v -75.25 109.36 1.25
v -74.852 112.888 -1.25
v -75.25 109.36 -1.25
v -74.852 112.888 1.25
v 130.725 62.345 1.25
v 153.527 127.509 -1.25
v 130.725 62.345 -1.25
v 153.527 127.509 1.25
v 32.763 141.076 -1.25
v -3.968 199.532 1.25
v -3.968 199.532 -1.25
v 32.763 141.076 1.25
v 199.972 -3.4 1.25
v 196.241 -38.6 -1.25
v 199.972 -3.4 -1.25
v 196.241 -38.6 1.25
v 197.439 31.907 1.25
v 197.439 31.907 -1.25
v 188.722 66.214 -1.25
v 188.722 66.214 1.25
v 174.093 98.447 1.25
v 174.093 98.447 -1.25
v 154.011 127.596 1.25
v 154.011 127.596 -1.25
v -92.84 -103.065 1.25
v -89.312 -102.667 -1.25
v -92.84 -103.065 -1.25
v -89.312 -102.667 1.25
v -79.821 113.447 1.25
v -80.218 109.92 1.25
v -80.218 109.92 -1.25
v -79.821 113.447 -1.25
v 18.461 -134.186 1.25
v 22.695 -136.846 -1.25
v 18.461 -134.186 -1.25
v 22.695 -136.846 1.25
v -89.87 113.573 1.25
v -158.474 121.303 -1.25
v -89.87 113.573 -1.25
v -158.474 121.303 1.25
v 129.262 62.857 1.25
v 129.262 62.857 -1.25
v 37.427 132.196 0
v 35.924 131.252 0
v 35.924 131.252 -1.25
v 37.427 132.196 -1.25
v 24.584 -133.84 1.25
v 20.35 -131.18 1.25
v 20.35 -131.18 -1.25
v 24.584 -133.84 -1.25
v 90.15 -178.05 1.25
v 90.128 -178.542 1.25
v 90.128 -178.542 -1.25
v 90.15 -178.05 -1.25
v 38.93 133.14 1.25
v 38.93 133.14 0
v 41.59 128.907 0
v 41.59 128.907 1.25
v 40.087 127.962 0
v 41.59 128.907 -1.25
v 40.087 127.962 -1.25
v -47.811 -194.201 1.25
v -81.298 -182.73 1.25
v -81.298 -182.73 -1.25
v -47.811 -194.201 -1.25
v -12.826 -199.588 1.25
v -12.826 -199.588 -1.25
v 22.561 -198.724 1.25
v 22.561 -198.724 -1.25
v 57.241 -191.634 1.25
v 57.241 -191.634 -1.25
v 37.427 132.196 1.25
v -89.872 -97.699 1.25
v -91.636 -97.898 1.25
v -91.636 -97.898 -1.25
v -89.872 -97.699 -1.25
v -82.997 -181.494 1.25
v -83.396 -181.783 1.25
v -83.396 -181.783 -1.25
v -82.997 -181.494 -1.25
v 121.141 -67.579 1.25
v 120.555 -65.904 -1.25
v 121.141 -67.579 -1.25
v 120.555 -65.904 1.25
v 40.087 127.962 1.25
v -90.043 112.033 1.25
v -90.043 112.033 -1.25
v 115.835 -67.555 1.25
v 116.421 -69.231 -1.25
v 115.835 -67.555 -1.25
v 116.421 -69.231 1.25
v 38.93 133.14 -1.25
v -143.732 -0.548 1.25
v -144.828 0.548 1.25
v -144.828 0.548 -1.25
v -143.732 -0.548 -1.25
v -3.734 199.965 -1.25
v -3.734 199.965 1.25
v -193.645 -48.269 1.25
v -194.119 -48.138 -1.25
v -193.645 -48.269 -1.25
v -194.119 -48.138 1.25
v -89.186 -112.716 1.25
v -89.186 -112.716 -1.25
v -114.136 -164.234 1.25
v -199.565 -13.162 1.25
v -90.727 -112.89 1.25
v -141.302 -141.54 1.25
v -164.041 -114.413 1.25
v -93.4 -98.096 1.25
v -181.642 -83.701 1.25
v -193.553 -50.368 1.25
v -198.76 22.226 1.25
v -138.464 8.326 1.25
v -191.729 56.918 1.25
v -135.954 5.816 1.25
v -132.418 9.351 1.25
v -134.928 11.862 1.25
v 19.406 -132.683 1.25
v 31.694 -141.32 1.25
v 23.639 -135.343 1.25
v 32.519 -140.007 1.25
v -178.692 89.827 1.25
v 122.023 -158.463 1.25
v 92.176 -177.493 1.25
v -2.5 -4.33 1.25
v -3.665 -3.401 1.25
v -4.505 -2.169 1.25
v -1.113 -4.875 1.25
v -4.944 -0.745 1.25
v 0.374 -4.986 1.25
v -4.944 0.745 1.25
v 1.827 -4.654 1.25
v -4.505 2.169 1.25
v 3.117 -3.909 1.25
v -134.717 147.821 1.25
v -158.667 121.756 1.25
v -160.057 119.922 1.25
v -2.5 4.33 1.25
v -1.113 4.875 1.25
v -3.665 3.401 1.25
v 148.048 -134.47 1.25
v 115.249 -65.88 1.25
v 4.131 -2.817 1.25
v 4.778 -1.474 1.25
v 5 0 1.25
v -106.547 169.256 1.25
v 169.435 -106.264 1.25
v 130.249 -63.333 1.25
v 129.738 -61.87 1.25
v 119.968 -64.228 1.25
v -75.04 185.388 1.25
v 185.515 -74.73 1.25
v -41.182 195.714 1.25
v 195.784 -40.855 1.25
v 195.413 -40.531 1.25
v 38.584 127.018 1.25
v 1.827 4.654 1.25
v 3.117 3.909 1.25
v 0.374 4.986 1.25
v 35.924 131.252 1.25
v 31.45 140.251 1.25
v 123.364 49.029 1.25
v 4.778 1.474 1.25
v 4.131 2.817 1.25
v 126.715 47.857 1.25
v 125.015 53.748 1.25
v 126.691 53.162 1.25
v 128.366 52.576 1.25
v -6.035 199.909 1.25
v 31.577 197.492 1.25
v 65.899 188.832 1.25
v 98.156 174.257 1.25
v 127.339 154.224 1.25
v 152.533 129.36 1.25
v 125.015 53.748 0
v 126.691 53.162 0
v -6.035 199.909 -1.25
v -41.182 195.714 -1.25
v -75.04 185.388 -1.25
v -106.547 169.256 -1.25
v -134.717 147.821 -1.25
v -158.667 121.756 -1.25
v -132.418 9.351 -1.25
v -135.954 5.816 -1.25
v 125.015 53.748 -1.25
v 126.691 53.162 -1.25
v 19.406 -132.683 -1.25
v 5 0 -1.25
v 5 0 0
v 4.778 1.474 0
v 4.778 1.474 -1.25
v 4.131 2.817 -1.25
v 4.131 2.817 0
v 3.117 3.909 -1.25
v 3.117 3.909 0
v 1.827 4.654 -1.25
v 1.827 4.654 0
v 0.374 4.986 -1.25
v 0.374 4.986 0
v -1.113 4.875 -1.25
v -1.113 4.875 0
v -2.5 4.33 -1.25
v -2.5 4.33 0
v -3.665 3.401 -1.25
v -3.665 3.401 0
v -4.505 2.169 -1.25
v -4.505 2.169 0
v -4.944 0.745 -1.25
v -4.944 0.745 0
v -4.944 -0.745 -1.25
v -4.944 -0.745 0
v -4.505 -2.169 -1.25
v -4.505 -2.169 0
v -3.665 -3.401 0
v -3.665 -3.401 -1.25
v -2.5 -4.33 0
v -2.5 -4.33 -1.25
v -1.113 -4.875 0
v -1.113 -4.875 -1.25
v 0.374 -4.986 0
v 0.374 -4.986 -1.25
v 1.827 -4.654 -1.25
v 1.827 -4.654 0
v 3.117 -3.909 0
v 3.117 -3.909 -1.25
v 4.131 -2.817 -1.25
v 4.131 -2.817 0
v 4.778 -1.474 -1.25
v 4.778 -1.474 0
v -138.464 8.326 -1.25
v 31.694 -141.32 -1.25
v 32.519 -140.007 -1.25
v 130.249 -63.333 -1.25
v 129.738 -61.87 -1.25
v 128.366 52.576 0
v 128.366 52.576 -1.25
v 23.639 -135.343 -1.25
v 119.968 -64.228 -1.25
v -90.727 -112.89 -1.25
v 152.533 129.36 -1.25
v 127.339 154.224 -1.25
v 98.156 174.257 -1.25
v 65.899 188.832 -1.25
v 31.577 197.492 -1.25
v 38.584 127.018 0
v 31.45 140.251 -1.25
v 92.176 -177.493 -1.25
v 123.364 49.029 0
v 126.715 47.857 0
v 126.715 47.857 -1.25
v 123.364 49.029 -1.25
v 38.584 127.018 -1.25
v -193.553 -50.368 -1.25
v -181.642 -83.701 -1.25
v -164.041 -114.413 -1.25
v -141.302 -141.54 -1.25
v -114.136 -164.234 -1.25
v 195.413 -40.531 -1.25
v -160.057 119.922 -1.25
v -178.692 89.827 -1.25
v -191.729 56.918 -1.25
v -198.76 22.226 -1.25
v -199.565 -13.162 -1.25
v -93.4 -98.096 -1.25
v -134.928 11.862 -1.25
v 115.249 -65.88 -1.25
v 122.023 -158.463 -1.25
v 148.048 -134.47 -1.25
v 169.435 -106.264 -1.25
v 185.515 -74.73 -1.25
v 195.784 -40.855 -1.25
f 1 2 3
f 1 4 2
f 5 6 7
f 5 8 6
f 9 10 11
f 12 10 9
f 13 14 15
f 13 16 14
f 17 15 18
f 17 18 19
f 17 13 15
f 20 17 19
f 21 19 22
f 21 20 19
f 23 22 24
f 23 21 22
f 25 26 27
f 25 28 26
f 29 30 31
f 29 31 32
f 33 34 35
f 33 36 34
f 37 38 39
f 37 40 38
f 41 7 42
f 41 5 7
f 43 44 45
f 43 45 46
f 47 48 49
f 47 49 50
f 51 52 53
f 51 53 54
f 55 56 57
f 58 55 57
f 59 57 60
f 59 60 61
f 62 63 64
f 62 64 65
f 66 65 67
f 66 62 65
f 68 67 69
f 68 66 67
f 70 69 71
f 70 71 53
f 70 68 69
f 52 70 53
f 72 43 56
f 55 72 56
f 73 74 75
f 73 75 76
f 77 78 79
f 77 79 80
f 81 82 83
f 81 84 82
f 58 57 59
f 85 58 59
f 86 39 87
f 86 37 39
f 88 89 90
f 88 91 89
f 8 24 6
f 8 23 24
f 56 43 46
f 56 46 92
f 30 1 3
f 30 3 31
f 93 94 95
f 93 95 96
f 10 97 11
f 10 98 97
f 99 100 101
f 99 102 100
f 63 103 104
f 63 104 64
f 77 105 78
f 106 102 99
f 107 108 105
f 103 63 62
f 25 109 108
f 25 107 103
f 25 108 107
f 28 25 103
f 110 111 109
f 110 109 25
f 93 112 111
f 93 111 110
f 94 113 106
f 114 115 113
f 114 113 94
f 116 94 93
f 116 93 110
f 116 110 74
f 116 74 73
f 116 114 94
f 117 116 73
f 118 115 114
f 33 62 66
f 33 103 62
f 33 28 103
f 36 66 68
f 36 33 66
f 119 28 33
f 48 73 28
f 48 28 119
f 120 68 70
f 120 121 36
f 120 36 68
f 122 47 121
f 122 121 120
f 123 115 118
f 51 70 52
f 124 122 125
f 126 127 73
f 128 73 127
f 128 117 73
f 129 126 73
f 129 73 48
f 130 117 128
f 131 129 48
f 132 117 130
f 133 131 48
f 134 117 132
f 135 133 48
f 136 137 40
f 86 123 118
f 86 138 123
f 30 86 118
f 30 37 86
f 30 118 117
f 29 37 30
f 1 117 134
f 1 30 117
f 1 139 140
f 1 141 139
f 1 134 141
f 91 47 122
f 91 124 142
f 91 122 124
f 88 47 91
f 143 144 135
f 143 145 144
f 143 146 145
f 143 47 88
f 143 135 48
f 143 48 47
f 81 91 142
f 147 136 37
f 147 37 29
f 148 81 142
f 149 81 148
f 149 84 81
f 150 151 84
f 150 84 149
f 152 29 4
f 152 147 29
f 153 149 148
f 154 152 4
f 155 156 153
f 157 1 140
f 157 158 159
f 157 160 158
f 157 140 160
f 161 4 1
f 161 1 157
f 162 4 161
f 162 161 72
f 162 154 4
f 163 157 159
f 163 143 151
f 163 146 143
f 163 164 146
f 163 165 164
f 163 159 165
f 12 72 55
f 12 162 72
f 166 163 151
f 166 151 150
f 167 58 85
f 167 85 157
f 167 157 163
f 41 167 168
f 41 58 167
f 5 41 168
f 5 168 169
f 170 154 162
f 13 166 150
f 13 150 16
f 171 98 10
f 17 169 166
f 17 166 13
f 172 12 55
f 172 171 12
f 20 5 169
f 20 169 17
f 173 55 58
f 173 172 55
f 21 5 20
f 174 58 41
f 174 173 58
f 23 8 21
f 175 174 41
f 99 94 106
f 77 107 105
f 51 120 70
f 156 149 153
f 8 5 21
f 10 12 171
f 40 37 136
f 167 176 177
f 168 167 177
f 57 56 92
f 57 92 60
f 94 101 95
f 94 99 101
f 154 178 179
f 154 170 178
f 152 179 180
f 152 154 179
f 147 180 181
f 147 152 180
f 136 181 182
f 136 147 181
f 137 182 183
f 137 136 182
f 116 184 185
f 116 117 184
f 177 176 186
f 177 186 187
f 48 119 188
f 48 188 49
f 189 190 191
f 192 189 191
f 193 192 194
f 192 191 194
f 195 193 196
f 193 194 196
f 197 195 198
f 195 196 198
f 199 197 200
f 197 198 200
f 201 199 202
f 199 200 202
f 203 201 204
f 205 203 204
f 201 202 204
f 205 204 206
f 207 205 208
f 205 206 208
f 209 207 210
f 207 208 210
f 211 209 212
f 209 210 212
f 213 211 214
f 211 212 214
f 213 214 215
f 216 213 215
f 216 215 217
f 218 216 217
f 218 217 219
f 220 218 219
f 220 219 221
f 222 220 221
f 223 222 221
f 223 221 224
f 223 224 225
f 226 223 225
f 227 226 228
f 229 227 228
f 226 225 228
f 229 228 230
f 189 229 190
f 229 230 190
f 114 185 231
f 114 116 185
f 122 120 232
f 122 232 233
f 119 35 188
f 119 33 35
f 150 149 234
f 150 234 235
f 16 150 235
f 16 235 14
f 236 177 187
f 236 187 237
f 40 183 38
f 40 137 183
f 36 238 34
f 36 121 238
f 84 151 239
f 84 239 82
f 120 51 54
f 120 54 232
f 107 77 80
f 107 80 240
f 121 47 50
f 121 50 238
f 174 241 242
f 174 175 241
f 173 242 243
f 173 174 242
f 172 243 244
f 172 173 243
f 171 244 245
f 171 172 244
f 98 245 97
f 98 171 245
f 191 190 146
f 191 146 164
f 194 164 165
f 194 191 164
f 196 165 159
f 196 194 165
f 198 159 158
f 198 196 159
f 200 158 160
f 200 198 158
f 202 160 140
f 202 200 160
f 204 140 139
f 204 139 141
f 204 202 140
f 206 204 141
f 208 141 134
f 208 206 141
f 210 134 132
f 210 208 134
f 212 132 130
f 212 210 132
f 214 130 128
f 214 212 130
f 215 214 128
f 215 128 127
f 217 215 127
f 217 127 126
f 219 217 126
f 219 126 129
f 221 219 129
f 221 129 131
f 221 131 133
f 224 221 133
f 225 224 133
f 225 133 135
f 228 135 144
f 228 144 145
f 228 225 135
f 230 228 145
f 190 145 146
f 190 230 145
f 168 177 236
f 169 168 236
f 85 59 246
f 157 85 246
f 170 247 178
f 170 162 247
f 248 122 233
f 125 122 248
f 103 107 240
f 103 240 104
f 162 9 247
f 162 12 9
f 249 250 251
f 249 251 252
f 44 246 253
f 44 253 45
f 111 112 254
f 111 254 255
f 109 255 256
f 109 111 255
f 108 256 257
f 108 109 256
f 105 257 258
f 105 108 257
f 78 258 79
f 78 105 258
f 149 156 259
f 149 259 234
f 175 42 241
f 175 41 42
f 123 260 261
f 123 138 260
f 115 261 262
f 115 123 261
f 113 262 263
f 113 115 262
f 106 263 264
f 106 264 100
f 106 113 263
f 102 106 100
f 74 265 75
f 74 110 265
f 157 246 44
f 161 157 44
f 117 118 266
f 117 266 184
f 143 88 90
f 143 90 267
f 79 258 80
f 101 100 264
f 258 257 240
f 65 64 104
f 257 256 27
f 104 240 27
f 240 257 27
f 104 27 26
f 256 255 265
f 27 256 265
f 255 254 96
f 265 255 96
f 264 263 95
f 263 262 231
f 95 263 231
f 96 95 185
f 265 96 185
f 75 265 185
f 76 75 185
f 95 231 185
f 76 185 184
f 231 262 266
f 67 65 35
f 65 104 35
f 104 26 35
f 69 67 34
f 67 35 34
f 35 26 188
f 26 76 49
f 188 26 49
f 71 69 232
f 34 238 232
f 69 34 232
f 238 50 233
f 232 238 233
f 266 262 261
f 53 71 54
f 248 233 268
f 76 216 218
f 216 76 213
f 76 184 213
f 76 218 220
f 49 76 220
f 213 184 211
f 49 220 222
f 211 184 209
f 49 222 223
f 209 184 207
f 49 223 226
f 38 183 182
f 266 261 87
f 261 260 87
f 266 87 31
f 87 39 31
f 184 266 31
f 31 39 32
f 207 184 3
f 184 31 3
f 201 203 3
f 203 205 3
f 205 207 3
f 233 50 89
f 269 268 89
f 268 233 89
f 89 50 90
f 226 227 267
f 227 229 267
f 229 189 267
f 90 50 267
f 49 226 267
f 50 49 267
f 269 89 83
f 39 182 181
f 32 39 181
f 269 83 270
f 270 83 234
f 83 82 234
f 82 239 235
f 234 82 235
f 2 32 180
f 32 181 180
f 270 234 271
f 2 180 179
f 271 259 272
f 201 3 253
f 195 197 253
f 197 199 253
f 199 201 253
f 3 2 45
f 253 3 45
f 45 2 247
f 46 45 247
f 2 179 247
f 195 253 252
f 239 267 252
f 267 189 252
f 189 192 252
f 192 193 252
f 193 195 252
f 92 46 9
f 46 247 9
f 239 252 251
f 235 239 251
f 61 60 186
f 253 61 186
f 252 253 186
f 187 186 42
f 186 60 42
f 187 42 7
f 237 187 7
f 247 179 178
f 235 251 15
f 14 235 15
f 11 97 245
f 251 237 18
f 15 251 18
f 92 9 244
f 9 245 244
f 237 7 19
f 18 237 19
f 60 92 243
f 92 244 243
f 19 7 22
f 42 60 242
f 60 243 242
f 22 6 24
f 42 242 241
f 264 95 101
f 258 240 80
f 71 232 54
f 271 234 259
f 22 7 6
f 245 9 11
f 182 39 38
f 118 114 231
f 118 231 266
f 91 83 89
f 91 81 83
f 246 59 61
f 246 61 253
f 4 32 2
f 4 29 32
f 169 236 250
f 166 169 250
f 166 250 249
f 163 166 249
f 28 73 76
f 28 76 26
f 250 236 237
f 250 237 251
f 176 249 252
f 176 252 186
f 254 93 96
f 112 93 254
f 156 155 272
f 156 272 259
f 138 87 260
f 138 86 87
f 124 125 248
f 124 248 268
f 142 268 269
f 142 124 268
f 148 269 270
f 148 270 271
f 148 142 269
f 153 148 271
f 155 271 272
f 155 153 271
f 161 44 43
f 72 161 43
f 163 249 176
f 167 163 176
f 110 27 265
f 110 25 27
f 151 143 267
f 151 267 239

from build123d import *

# Parameters (mm, degrees)
F0_R          = 5
F1_DEPTH      = 1.25
F1_DEPTH_BACK = 1.25


with BuildPart() as f1:
    # F0 (on Top) → F1 (new body, two sides)
    with BuildSketch(Plane.XY) as f1_sk:
        with BuildLine():
            Line((-193.64496, -48.269231), (-144.827721, 0.548008))
            Line((-144.827721, 0.548008), (-143.731706, -0.548008))
            Line((-143.731706, -0.548008), (-193.552665, -50.368296))
            ThreePointArc((-193.552665, -50.368296), (-153.272634, -128.48028), (-83.395599, -181.782841))
            Line((-83.395599, -181.782841), (-82.996864, -181.493909))
            Line((-82.996864, -181.493909), (-90.726667, -112.890004))
            Line((-90.726667, -112.890004), (-89.186413, -112.716459))
            Line((-89.186413, -112.716459), (-81.298203, -182.730495))
            ThreePointArc((-81.298203, -182.730495), (4.886394, -199.940324), (90.127633, -178.541862))
            Line((90.127633, -178.541862), (90.150343, -178.049972))
            Line((90.150343, -178.049972), (31.694198, -141.319541))
            Line((31.694198, -141.319541), (32.518847, -140.007118))
            Line((32.518847, -140.007118), (92.176243, -177.492904))
            ThreePointArc((92.176243, -177.492904), (159.366647, -120.841226), (195.783698, -40.855219))
            Line((195.783698, -40.855219), (195.413283, -40.530774))
            Line((195.413283, -40.530774), (130.249465, -63.33258))
            Line((130.249465, -63.33258), (129.737532, -61.869561))
            Line((129.737532, -61.869561), (196.240878, -38.599537))
            ThreePointArc((196.240878, -38.599537), (193.841344, 49.25378), (154.011425, 127.596237))
            Line((154.011425, 127.596237), (153.526814, 127.508923))
            Line((153.526814, 127.508923), (130.725008, 62.345105))
            Line((130.725008, 62.345105), (129.261989, 62.857037))
            Line((129.261989, 62.857037), (152.532909, 129.360069))
            ThreePointArc((152.532909, 129.360069), (82.350335, 182.259685), (-3.733812, 199.965124))
            Line((-3.733812, 199.965124), (-3.967697, 199.5318))
            Line((-3.967697, 199.5318), (32.762734, 141.075654))
            Line((32.762734, 141.075654), (31.450311, 140.251005))
            Line((31.450311, 140.251005), (-6.034672, 199.908905))
            ThreePointArc((-6.034672, 199.908905), (-91.151376, 178.02033), (-158.666634, 121.756194))
            Line((-158.666634, 121.756194), (-158.473672, 121.303162))
            Line((-158.473672, 121.303162), (-89.869768, 113.573359))
            Line((-89.869768, 113.573359), (-90.043313, 112.033105))
            Line((-90.043313, 112.033105), (-160.057242, 119.922257))
            ThreePointArc((-160.057242, 119.922257), (-196.013462, 39.728035), (-194.119464, -48.137634))
            Line((-194.119464, -48.137634), (-193.64496, -48.269231))
        make_face()
        Polygon((-91.636007, -97.897549), (-89.872168, -97.698812), (-89.312346, -102.667373), (-91.076185, -102.86611), (-92.840024, -103.064847), (-93.399847, -98.096286), align=None, mode=Mode.SUBTRACT)
        Circle(F0_R, mode=Mode.SUBTRACT)
        Polygon((19.405659, -132.682848), (20.350016, -131.179913), (24.583637, -133.840073), (23.63928, -135.343009), (22.694924, -136.845944), (18.461303, -134.185784), align=None, mode=Mode.SUBTRACT)
        Polygon((115.835249, -67.555257), (115.249003, -65.879864), (119.96842, -64.228469), (120.554665, -65.903862), (121.140911, -67.579254), (116.421494, -69.23065), align=None, mode=Mode.SUBTRACT)
        Polygon((-137.208646, 7.071068), (-138.46376, 8.326182), (-134.928226, 11.861716), (-133.673112, 10.606602), (-132.417997, 9.351487), (-135.953531, 5.815953), align=None, mode=Mode.SUBTRACT)
        Polygon((-75.050857, 111.123765), (-75.249594, 109.359926), (-80.218155, 109.919748), (-80.019418, 111.683587), (-79.820681, 113.447426), (-74.85212, 112.887604), align=None, mode=Mode.SUBTRACT)
        Polygon((125.039313, 48.442821), (123.36392, 49.029066), (125.015315, 53.748483), (126.690708, 53.162238), (128.366101, 52.575992), (126.714706, 47.856576), align=None, mode=Mode.SUBTRACT)
        Polygon((40.087004, 127.962466), (38.584068, 127.01811), (35.923908, 131.251731), (37.426843, 132.196087), (38.929779, 133.140444), (41.589939, 128.906823), align=None, mode=Mode.SUBTRACT)
    extrude(amount=F1_DEPTH)
    extrude(f1_sk.sketch, amount=-F1_DEPTH_BACK)


solid = f1.part
